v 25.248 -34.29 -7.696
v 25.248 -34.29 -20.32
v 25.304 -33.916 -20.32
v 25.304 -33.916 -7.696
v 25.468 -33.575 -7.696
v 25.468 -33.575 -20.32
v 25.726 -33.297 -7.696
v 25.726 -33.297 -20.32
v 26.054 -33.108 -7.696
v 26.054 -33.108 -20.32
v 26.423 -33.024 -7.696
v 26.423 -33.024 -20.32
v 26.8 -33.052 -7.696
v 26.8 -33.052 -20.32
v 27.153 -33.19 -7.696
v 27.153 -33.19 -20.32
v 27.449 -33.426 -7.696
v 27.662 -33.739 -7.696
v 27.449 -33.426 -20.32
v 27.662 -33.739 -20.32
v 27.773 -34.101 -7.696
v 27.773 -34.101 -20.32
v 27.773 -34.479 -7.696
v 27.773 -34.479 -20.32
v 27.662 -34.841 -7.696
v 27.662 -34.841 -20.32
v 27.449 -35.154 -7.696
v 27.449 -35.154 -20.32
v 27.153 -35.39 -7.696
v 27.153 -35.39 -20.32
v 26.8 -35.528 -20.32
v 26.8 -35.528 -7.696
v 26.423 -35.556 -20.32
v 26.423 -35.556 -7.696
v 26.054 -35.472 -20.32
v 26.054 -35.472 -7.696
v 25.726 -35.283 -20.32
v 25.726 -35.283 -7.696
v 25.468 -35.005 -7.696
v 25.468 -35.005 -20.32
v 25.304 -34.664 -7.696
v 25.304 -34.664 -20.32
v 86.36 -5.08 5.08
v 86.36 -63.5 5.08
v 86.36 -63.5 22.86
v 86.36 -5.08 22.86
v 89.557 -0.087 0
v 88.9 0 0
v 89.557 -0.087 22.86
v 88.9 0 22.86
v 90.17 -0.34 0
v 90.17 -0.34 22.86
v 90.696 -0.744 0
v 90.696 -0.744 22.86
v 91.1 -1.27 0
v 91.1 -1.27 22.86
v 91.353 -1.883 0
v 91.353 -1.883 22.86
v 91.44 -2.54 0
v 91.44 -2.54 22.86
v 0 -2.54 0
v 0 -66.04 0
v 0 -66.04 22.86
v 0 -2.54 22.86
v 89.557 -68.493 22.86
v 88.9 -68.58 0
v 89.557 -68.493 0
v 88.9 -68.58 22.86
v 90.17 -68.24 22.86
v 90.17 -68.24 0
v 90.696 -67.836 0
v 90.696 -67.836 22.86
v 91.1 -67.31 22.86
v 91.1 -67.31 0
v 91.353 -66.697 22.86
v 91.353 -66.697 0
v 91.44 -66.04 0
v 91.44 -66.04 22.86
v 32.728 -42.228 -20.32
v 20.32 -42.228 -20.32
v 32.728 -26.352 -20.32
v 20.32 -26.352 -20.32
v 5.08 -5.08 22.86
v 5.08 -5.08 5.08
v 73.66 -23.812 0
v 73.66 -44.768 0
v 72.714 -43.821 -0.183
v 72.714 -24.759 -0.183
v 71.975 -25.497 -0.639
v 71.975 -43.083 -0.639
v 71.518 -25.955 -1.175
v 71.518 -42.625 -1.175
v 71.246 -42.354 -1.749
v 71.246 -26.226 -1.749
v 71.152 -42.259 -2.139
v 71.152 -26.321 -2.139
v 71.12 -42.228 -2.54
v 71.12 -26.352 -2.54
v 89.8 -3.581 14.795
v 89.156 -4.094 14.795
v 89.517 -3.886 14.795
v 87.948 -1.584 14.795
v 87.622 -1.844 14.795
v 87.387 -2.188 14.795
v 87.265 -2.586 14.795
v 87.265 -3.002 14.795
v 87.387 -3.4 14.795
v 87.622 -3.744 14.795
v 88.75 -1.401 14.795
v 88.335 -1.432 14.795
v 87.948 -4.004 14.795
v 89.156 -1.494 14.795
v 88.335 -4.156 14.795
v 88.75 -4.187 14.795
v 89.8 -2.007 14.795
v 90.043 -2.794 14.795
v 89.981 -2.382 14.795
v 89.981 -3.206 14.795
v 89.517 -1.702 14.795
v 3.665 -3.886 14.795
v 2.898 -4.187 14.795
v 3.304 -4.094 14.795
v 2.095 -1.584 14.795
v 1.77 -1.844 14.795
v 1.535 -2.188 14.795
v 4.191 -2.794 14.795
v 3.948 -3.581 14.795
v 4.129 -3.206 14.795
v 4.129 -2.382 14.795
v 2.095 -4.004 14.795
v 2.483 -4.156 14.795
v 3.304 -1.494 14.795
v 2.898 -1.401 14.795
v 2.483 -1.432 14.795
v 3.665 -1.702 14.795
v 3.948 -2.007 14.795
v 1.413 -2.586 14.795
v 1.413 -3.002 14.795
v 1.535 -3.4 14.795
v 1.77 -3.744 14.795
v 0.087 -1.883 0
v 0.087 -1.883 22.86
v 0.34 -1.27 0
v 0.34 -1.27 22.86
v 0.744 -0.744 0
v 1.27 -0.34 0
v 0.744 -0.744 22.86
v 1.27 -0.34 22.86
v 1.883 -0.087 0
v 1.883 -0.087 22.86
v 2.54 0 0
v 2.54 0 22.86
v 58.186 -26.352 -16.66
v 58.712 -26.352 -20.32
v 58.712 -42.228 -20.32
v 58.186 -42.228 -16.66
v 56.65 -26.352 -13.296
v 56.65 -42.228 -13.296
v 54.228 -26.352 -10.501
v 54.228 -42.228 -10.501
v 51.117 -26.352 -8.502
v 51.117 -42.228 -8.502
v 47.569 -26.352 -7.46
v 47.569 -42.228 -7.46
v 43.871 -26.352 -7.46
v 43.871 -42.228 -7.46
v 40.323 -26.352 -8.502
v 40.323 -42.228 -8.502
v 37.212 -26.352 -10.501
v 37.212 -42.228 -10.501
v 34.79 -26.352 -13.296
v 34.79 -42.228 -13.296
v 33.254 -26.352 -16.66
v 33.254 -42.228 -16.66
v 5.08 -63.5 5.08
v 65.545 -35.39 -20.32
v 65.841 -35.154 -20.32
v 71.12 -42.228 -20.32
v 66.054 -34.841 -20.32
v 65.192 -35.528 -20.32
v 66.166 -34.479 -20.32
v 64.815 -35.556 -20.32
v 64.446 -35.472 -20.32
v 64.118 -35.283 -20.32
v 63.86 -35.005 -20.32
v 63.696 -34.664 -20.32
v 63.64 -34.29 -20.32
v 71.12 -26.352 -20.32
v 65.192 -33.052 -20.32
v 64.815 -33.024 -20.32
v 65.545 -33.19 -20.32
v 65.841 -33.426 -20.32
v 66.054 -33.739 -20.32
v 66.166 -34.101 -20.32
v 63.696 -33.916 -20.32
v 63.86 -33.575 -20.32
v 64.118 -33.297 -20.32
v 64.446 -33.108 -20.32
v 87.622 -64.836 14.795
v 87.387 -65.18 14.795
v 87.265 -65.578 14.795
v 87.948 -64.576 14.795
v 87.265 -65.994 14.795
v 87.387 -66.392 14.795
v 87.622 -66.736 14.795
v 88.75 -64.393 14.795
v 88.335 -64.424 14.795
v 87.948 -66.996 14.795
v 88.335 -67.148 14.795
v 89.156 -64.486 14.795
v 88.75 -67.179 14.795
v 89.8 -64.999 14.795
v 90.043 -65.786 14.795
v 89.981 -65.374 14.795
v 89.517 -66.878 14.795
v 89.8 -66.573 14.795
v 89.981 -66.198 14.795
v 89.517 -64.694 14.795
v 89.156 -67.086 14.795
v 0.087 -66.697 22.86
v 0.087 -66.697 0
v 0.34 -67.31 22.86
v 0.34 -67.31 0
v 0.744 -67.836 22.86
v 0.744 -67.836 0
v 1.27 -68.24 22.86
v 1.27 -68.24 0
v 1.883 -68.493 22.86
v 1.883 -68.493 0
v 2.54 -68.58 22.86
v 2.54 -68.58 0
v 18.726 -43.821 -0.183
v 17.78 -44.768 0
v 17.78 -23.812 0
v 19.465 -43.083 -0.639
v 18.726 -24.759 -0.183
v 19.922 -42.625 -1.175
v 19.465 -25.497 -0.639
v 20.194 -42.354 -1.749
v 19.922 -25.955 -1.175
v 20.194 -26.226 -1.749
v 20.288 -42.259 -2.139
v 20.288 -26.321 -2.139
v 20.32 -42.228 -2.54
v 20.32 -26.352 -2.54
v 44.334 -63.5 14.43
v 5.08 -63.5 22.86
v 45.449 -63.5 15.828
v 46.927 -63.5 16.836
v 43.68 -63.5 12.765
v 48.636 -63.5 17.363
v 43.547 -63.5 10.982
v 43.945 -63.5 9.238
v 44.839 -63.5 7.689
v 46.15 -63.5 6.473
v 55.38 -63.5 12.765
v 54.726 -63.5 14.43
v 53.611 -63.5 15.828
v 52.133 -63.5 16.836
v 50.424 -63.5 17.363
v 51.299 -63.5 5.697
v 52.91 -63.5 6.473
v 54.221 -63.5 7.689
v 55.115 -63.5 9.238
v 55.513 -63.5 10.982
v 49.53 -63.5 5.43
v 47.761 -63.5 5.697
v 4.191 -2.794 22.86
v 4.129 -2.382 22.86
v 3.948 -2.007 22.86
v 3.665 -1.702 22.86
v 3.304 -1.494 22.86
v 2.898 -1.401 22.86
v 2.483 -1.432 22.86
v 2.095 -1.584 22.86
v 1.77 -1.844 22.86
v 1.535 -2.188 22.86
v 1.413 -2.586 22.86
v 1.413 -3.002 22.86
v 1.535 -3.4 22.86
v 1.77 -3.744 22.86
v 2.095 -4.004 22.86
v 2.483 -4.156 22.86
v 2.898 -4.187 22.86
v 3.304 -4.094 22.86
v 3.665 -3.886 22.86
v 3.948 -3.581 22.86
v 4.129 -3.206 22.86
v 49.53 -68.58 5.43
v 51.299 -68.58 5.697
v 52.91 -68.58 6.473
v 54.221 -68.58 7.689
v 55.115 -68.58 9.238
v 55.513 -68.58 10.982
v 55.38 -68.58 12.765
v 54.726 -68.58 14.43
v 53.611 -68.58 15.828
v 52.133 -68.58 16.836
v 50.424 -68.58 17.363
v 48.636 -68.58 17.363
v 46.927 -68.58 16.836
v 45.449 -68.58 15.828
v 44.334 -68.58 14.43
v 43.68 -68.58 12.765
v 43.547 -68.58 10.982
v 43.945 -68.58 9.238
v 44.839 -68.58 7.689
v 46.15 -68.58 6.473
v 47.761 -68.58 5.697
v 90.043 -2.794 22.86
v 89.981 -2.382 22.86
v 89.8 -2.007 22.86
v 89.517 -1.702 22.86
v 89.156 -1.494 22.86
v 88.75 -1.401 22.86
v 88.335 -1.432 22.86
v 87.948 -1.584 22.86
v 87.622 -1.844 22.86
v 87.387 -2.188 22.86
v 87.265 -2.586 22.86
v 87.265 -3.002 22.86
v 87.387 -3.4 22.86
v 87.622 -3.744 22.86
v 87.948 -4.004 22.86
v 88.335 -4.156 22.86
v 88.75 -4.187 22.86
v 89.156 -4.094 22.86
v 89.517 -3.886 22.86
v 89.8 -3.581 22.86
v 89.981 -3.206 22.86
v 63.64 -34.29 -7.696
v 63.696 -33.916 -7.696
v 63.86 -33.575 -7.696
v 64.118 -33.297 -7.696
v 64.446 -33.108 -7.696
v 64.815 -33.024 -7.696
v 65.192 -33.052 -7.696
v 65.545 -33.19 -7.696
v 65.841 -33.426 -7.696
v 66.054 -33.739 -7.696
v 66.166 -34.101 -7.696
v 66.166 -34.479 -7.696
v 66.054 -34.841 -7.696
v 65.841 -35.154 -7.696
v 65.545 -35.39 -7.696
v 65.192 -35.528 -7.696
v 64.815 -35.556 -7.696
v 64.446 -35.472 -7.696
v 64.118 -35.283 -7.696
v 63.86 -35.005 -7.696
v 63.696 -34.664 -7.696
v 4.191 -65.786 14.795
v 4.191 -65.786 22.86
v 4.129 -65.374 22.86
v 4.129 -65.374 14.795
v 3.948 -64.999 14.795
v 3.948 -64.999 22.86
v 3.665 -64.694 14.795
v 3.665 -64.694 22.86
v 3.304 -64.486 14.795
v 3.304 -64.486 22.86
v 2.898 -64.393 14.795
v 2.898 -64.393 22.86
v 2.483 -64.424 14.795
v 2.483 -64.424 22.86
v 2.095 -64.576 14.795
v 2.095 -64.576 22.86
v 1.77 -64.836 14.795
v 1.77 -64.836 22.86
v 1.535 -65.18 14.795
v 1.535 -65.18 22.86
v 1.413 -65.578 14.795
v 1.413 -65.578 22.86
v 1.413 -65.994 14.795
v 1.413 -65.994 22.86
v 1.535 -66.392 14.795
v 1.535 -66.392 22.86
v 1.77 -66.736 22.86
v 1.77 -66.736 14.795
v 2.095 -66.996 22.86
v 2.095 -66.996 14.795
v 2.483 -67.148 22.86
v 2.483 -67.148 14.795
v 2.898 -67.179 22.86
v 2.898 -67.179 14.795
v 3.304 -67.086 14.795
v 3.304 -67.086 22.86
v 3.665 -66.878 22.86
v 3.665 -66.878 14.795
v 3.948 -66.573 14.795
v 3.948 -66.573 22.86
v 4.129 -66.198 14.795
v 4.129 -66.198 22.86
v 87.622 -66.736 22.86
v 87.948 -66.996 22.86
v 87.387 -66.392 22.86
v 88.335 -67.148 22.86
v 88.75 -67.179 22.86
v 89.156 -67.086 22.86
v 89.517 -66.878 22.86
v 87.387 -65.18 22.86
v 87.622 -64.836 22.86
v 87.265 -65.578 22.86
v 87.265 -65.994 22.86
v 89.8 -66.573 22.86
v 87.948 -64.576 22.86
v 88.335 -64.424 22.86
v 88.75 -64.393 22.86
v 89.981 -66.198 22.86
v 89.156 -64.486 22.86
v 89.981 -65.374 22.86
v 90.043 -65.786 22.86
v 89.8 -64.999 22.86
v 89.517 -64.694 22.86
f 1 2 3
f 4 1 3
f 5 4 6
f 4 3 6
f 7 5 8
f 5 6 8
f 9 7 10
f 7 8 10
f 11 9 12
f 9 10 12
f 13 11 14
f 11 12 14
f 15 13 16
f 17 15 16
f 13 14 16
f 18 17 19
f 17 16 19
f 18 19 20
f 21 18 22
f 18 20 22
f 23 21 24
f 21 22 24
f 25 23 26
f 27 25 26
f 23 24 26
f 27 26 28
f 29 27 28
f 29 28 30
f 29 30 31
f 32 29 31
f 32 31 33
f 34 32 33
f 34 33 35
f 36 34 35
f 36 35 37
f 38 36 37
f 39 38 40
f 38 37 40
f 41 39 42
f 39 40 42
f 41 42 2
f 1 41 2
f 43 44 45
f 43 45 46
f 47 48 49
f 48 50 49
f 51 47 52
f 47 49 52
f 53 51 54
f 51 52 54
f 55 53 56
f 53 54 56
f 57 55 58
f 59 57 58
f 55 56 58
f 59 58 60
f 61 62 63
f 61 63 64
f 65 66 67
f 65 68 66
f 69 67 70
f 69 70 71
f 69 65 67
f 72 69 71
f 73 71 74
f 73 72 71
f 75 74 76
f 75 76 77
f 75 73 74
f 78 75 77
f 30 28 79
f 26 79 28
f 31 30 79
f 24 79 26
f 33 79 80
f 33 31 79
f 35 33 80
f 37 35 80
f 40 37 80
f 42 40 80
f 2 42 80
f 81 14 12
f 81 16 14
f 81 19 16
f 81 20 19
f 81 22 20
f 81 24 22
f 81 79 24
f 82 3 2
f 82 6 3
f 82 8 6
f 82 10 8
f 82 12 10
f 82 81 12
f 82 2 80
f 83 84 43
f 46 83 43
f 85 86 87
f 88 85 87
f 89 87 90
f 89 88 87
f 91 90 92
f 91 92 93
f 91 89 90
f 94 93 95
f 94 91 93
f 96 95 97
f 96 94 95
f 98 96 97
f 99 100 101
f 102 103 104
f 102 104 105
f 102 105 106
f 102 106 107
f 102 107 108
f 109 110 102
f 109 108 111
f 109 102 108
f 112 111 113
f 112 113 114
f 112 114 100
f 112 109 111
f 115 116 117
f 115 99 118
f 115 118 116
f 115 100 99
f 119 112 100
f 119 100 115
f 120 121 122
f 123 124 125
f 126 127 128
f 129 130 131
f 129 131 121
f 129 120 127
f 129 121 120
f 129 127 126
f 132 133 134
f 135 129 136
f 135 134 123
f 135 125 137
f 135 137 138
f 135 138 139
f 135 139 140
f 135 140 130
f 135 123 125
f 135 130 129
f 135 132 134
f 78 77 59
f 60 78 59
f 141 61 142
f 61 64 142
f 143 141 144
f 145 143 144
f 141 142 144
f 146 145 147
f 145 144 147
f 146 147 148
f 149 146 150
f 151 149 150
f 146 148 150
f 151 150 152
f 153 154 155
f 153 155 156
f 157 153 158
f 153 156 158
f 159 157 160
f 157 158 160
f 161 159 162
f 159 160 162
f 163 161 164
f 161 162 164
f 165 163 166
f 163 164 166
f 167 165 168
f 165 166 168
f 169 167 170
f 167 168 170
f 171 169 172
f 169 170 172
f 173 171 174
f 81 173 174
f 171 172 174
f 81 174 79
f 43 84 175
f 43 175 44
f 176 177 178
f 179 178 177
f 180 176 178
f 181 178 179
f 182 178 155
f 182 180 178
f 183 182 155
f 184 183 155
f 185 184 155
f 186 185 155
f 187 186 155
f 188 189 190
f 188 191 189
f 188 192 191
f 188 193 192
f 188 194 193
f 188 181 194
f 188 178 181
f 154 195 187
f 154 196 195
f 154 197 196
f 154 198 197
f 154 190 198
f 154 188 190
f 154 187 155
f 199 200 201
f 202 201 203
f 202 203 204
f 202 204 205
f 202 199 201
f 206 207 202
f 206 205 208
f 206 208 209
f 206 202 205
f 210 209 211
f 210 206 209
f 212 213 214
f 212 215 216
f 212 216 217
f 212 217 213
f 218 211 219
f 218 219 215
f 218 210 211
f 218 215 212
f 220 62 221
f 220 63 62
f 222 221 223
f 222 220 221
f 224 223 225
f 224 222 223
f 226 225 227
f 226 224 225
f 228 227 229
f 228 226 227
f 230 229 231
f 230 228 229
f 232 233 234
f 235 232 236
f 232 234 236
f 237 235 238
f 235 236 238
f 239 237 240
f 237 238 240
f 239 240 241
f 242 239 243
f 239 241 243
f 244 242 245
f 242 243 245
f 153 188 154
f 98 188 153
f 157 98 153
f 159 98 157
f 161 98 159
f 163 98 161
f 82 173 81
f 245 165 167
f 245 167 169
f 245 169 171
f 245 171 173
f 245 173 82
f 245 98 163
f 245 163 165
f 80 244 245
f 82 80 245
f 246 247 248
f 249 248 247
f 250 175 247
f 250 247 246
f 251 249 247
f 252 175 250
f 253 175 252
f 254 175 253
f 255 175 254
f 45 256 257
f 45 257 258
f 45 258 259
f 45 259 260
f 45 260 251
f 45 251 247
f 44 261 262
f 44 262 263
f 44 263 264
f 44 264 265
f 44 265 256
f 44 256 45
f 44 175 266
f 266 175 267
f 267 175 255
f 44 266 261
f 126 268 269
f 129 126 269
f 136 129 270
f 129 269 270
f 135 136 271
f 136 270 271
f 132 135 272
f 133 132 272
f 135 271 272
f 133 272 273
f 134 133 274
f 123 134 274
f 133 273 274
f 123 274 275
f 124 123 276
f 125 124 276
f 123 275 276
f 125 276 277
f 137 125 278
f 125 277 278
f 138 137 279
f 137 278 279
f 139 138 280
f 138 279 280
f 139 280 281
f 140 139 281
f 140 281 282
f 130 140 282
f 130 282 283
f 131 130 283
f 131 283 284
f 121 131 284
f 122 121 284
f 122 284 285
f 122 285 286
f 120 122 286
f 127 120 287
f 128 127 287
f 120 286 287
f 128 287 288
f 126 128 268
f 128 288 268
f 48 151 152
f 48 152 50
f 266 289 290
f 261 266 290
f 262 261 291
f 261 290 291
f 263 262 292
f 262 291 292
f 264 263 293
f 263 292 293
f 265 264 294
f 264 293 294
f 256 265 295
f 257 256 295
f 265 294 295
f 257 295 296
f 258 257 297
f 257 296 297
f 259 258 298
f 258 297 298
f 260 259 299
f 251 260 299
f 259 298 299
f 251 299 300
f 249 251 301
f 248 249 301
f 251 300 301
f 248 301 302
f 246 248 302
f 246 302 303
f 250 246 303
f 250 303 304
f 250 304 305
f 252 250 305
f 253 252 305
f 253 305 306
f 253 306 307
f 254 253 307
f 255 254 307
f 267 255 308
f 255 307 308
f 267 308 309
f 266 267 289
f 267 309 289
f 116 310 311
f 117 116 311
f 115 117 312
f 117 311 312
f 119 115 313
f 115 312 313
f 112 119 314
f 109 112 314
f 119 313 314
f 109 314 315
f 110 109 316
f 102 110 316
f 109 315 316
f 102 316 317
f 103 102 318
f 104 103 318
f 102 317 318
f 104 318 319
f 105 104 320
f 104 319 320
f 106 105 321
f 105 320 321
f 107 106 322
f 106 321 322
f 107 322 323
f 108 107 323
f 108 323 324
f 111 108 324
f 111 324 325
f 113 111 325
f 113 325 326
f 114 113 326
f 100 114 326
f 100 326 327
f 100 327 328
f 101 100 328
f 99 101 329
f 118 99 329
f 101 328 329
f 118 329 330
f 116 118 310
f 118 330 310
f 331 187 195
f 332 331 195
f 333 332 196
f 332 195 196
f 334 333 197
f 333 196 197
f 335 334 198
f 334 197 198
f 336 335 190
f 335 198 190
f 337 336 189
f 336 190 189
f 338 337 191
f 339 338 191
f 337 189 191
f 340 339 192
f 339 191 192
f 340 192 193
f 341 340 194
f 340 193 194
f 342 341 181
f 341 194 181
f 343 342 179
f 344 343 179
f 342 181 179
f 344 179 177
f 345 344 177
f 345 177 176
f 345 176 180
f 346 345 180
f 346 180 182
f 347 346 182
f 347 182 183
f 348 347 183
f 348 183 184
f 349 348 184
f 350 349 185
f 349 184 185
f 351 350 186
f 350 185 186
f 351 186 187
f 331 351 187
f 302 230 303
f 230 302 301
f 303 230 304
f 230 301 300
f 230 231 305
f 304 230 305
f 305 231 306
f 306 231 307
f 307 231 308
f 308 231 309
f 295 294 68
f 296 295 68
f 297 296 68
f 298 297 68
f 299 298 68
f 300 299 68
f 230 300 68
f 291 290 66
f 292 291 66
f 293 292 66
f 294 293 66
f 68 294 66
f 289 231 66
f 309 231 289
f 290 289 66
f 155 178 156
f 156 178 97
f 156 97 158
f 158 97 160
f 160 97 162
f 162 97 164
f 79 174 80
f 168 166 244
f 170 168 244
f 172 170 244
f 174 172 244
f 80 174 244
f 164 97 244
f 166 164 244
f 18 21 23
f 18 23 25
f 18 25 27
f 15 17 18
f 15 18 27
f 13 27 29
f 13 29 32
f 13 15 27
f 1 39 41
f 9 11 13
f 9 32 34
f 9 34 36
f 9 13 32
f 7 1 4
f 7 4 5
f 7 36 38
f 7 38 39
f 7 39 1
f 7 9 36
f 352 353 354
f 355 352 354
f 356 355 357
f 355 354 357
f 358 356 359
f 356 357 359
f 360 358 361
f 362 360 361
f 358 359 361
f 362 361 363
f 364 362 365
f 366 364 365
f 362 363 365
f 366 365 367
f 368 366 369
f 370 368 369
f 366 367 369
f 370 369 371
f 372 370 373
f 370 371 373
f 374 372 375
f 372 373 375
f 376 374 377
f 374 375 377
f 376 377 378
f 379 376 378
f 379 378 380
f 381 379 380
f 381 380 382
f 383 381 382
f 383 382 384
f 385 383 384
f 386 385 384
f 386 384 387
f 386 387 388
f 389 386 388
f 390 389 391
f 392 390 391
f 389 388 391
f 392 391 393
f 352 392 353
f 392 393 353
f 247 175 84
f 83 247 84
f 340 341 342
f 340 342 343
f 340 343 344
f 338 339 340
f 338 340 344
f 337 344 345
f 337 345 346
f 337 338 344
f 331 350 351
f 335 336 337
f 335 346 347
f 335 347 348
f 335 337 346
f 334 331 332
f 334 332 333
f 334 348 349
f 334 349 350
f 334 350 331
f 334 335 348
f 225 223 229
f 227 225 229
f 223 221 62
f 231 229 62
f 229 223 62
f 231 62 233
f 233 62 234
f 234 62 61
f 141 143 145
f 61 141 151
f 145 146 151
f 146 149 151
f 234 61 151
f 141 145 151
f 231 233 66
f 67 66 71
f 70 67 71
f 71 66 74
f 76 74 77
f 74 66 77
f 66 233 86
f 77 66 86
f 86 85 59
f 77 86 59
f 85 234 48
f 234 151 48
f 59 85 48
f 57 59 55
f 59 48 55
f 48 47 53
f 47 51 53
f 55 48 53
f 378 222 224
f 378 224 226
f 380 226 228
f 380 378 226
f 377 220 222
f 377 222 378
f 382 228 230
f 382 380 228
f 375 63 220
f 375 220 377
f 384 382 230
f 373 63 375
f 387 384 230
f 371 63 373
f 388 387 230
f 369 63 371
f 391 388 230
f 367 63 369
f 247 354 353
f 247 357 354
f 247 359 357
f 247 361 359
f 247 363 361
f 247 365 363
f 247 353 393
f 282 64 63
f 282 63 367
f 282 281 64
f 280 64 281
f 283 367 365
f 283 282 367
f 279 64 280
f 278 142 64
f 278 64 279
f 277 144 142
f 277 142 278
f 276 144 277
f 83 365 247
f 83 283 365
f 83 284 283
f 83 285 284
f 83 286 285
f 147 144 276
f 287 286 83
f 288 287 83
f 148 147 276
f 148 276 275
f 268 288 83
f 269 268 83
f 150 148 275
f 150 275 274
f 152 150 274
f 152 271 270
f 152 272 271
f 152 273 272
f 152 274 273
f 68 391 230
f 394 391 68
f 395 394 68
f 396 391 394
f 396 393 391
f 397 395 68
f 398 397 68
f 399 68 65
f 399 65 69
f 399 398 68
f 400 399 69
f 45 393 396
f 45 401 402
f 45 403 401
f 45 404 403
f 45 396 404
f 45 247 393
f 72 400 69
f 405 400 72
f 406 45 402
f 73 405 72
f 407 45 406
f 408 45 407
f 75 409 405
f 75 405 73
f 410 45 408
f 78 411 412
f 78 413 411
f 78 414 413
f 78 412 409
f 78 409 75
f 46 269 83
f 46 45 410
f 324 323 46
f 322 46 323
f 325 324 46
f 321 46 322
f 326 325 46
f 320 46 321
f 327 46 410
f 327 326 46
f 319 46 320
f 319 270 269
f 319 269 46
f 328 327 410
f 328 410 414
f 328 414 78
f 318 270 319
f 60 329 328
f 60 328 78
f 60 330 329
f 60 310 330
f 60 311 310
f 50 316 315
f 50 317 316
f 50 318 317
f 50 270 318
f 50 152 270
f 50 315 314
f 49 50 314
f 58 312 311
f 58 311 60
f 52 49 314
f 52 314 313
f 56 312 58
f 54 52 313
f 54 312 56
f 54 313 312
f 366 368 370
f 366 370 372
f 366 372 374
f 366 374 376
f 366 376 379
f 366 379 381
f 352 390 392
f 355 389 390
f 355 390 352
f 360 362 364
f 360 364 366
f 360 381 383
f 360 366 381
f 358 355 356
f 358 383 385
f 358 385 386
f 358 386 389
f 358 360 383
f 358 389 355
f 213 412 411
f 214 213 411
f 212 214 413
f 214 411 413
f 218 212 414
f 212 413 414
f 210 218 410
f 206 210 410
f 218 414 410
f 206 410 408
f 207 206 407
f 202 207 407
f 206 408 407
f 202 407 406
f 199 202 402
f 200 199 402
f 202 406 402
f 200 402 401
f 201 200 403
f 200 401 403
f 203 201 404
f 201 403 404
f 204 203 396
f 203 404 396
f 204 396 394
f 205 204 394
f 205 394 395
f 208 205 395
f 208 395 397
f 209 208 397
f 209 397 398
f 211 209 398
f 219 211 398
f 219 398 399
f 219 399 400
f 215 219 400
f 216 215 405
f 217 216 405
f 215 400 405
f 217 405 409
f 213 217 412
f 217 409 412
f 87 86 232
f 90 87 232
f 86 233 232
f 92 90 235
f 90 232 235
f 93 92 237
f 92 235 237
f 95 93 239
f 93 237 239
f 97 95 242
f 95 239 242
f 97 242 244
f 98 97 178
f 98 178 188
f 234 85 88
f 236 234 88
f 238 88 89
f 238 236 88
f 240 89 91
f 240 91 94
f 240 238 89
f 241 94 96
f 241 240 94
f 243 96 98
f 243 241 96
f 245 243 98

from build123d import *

# Parameters (mm, degrees)
SKETCH1_W           = 91.44
SKETCH1_H           = 68.58
BOSS_EXTRUDE1_DEPTH = 22.86
SHELL1_T            = -5.08
SKETCH2_R           = 1.397
CUT_EXTRUDE1_DEPTH  = 8.0645
FILLET1_R           = 2.54
SKETCH3_R           = 6
CUT_EXTRUDE2_DEPTH  = 5.08
SKETCH4_W           = 50.8
SKETCH4_H           = 15.875
BOSS_EXTRUDE2_DEPTH = 20.32
SKETCH5_R           = 12.9921
CUT_EXTRUDE3_DEPTH  = 104.281242035
SKETCH6_R           = 1.27
CUT_EXTRUDE4_DEPTH  = 12.6238
FILLET2_R           = 2.54


with BuildPart() as part:
    # Sketch1 → Boss-Extrude1 (new body)
    with BuildSketch(Plane.XY):
        with Locations((45.72, -34.29)):
            Rectangle(SKETCH1_W, SKETCH1_H)
    extrude(amount=BOSS_EXTRUDE1_DEPTH)

    # Shell1
    shell1_openings = [part.faces().sort_by_distance(p)[0] for p in [
        (45.72, -34.29, 22.86),
    ]]
    offset(amount=SHELL1_T, openings=shell1_openings, kind=Kind.INTERSECTION)

    # Sketch2 → Cut-Extrude1 (cut)
    with BuildSketch(Plane.XY.offset(22.86)):
        with Locations((2.794, -2.794)):
            Circle(SKETCH2_R)
        with Locations((88.646, -2.794)):
            Circle(SKETCH2_R)
        with Locations((88.646, -65.786)):
            Circle(SKETCH2_R)
        with Locations((2.794, -65.786)):
            Circle(SKETCH2_R)
    extrude(amount=-CUT_EXTRUDE1_DEPTH, mode=Mode.SUBTRACT)

    # Fillet1
    fillet1_edges = [part.edges().sort_by_distance(p)[0] for p in [
        (0, 0, 11.43),
        (91.44, 0, 11.43),
        (91.44, -68.58, 11.43),
        (0, -68.58, 11.43),
    ]]
    fillet(fillet1_edges, radius=FILLET1_R)

    # Sketch3 → Cut-Extrude2 (cut)
    with BuildSketch(Plane(origin=(0, -68.58, 0), x_dir=(-1, 0, 0), z_dir=(0, -1, 0))):
        with Locations(Location((-49.53, -11.43, 0), (0, 0, 90))):
            Circle(SKETCH3_R)
    extrude(amount=-CUT_EXTRUDE2_DEPTH, mode=Mode.SUBTRACT)

    # Sketch4 → Boss-Extrude2 (add)
    with BuildSketch(Plane(origin=(0, 0, 0), x_dir=(-1, 0, 0), z_dir=(0, 0, -1))):
        with Locations((-45.72, -34.29)):
            Rectangle(SKETCH4_W, SKETCH4_H)
    extrude(amount=BOSS_EXTRUDE2_DEPTH)

    # Sketch5 → Cut-Extrude3 (cut, through all)
    with BuildSketch(Plane.XZ.offset(42.2275)):
        with Locations((45.72, -20.32)):
            Circle(SKETCH5_R)
    extrude(amount=-CUT_EXTRUDE3_DEPTH, mode=Mode.SUBTRACT)

    # Sketch6 → Cut-Extrude4 (cut)
    with BuildSketch(Plane(origin=(0, 0, -20.32), x_dir=(-1, 0, 0), z_dir=(0, 0, -1))):
        with Locations((-26.5176, -34.29)):
            Circle(SKETCH6_R)
        with Locations((-64.9097, -34.29)):
            Circle(SKETCH6_R)
    extrude(amount=-CUT_EXTRUDE4_DEPTH, mode=Mode.SUBTRACT)

    # Fillet2
    fillet2_edges = [part.edges().sort_by_distance(p)[0] for p in [
        (20.32, -34.29, 0),
        (45.72, -26.3525, 0),
        (71.12, -34.29, 0),
        (45.72, -42.2275, 0),
    ]]
    fillet(fillet2_edges, radius=FILLET2_R)


solid = part.part
